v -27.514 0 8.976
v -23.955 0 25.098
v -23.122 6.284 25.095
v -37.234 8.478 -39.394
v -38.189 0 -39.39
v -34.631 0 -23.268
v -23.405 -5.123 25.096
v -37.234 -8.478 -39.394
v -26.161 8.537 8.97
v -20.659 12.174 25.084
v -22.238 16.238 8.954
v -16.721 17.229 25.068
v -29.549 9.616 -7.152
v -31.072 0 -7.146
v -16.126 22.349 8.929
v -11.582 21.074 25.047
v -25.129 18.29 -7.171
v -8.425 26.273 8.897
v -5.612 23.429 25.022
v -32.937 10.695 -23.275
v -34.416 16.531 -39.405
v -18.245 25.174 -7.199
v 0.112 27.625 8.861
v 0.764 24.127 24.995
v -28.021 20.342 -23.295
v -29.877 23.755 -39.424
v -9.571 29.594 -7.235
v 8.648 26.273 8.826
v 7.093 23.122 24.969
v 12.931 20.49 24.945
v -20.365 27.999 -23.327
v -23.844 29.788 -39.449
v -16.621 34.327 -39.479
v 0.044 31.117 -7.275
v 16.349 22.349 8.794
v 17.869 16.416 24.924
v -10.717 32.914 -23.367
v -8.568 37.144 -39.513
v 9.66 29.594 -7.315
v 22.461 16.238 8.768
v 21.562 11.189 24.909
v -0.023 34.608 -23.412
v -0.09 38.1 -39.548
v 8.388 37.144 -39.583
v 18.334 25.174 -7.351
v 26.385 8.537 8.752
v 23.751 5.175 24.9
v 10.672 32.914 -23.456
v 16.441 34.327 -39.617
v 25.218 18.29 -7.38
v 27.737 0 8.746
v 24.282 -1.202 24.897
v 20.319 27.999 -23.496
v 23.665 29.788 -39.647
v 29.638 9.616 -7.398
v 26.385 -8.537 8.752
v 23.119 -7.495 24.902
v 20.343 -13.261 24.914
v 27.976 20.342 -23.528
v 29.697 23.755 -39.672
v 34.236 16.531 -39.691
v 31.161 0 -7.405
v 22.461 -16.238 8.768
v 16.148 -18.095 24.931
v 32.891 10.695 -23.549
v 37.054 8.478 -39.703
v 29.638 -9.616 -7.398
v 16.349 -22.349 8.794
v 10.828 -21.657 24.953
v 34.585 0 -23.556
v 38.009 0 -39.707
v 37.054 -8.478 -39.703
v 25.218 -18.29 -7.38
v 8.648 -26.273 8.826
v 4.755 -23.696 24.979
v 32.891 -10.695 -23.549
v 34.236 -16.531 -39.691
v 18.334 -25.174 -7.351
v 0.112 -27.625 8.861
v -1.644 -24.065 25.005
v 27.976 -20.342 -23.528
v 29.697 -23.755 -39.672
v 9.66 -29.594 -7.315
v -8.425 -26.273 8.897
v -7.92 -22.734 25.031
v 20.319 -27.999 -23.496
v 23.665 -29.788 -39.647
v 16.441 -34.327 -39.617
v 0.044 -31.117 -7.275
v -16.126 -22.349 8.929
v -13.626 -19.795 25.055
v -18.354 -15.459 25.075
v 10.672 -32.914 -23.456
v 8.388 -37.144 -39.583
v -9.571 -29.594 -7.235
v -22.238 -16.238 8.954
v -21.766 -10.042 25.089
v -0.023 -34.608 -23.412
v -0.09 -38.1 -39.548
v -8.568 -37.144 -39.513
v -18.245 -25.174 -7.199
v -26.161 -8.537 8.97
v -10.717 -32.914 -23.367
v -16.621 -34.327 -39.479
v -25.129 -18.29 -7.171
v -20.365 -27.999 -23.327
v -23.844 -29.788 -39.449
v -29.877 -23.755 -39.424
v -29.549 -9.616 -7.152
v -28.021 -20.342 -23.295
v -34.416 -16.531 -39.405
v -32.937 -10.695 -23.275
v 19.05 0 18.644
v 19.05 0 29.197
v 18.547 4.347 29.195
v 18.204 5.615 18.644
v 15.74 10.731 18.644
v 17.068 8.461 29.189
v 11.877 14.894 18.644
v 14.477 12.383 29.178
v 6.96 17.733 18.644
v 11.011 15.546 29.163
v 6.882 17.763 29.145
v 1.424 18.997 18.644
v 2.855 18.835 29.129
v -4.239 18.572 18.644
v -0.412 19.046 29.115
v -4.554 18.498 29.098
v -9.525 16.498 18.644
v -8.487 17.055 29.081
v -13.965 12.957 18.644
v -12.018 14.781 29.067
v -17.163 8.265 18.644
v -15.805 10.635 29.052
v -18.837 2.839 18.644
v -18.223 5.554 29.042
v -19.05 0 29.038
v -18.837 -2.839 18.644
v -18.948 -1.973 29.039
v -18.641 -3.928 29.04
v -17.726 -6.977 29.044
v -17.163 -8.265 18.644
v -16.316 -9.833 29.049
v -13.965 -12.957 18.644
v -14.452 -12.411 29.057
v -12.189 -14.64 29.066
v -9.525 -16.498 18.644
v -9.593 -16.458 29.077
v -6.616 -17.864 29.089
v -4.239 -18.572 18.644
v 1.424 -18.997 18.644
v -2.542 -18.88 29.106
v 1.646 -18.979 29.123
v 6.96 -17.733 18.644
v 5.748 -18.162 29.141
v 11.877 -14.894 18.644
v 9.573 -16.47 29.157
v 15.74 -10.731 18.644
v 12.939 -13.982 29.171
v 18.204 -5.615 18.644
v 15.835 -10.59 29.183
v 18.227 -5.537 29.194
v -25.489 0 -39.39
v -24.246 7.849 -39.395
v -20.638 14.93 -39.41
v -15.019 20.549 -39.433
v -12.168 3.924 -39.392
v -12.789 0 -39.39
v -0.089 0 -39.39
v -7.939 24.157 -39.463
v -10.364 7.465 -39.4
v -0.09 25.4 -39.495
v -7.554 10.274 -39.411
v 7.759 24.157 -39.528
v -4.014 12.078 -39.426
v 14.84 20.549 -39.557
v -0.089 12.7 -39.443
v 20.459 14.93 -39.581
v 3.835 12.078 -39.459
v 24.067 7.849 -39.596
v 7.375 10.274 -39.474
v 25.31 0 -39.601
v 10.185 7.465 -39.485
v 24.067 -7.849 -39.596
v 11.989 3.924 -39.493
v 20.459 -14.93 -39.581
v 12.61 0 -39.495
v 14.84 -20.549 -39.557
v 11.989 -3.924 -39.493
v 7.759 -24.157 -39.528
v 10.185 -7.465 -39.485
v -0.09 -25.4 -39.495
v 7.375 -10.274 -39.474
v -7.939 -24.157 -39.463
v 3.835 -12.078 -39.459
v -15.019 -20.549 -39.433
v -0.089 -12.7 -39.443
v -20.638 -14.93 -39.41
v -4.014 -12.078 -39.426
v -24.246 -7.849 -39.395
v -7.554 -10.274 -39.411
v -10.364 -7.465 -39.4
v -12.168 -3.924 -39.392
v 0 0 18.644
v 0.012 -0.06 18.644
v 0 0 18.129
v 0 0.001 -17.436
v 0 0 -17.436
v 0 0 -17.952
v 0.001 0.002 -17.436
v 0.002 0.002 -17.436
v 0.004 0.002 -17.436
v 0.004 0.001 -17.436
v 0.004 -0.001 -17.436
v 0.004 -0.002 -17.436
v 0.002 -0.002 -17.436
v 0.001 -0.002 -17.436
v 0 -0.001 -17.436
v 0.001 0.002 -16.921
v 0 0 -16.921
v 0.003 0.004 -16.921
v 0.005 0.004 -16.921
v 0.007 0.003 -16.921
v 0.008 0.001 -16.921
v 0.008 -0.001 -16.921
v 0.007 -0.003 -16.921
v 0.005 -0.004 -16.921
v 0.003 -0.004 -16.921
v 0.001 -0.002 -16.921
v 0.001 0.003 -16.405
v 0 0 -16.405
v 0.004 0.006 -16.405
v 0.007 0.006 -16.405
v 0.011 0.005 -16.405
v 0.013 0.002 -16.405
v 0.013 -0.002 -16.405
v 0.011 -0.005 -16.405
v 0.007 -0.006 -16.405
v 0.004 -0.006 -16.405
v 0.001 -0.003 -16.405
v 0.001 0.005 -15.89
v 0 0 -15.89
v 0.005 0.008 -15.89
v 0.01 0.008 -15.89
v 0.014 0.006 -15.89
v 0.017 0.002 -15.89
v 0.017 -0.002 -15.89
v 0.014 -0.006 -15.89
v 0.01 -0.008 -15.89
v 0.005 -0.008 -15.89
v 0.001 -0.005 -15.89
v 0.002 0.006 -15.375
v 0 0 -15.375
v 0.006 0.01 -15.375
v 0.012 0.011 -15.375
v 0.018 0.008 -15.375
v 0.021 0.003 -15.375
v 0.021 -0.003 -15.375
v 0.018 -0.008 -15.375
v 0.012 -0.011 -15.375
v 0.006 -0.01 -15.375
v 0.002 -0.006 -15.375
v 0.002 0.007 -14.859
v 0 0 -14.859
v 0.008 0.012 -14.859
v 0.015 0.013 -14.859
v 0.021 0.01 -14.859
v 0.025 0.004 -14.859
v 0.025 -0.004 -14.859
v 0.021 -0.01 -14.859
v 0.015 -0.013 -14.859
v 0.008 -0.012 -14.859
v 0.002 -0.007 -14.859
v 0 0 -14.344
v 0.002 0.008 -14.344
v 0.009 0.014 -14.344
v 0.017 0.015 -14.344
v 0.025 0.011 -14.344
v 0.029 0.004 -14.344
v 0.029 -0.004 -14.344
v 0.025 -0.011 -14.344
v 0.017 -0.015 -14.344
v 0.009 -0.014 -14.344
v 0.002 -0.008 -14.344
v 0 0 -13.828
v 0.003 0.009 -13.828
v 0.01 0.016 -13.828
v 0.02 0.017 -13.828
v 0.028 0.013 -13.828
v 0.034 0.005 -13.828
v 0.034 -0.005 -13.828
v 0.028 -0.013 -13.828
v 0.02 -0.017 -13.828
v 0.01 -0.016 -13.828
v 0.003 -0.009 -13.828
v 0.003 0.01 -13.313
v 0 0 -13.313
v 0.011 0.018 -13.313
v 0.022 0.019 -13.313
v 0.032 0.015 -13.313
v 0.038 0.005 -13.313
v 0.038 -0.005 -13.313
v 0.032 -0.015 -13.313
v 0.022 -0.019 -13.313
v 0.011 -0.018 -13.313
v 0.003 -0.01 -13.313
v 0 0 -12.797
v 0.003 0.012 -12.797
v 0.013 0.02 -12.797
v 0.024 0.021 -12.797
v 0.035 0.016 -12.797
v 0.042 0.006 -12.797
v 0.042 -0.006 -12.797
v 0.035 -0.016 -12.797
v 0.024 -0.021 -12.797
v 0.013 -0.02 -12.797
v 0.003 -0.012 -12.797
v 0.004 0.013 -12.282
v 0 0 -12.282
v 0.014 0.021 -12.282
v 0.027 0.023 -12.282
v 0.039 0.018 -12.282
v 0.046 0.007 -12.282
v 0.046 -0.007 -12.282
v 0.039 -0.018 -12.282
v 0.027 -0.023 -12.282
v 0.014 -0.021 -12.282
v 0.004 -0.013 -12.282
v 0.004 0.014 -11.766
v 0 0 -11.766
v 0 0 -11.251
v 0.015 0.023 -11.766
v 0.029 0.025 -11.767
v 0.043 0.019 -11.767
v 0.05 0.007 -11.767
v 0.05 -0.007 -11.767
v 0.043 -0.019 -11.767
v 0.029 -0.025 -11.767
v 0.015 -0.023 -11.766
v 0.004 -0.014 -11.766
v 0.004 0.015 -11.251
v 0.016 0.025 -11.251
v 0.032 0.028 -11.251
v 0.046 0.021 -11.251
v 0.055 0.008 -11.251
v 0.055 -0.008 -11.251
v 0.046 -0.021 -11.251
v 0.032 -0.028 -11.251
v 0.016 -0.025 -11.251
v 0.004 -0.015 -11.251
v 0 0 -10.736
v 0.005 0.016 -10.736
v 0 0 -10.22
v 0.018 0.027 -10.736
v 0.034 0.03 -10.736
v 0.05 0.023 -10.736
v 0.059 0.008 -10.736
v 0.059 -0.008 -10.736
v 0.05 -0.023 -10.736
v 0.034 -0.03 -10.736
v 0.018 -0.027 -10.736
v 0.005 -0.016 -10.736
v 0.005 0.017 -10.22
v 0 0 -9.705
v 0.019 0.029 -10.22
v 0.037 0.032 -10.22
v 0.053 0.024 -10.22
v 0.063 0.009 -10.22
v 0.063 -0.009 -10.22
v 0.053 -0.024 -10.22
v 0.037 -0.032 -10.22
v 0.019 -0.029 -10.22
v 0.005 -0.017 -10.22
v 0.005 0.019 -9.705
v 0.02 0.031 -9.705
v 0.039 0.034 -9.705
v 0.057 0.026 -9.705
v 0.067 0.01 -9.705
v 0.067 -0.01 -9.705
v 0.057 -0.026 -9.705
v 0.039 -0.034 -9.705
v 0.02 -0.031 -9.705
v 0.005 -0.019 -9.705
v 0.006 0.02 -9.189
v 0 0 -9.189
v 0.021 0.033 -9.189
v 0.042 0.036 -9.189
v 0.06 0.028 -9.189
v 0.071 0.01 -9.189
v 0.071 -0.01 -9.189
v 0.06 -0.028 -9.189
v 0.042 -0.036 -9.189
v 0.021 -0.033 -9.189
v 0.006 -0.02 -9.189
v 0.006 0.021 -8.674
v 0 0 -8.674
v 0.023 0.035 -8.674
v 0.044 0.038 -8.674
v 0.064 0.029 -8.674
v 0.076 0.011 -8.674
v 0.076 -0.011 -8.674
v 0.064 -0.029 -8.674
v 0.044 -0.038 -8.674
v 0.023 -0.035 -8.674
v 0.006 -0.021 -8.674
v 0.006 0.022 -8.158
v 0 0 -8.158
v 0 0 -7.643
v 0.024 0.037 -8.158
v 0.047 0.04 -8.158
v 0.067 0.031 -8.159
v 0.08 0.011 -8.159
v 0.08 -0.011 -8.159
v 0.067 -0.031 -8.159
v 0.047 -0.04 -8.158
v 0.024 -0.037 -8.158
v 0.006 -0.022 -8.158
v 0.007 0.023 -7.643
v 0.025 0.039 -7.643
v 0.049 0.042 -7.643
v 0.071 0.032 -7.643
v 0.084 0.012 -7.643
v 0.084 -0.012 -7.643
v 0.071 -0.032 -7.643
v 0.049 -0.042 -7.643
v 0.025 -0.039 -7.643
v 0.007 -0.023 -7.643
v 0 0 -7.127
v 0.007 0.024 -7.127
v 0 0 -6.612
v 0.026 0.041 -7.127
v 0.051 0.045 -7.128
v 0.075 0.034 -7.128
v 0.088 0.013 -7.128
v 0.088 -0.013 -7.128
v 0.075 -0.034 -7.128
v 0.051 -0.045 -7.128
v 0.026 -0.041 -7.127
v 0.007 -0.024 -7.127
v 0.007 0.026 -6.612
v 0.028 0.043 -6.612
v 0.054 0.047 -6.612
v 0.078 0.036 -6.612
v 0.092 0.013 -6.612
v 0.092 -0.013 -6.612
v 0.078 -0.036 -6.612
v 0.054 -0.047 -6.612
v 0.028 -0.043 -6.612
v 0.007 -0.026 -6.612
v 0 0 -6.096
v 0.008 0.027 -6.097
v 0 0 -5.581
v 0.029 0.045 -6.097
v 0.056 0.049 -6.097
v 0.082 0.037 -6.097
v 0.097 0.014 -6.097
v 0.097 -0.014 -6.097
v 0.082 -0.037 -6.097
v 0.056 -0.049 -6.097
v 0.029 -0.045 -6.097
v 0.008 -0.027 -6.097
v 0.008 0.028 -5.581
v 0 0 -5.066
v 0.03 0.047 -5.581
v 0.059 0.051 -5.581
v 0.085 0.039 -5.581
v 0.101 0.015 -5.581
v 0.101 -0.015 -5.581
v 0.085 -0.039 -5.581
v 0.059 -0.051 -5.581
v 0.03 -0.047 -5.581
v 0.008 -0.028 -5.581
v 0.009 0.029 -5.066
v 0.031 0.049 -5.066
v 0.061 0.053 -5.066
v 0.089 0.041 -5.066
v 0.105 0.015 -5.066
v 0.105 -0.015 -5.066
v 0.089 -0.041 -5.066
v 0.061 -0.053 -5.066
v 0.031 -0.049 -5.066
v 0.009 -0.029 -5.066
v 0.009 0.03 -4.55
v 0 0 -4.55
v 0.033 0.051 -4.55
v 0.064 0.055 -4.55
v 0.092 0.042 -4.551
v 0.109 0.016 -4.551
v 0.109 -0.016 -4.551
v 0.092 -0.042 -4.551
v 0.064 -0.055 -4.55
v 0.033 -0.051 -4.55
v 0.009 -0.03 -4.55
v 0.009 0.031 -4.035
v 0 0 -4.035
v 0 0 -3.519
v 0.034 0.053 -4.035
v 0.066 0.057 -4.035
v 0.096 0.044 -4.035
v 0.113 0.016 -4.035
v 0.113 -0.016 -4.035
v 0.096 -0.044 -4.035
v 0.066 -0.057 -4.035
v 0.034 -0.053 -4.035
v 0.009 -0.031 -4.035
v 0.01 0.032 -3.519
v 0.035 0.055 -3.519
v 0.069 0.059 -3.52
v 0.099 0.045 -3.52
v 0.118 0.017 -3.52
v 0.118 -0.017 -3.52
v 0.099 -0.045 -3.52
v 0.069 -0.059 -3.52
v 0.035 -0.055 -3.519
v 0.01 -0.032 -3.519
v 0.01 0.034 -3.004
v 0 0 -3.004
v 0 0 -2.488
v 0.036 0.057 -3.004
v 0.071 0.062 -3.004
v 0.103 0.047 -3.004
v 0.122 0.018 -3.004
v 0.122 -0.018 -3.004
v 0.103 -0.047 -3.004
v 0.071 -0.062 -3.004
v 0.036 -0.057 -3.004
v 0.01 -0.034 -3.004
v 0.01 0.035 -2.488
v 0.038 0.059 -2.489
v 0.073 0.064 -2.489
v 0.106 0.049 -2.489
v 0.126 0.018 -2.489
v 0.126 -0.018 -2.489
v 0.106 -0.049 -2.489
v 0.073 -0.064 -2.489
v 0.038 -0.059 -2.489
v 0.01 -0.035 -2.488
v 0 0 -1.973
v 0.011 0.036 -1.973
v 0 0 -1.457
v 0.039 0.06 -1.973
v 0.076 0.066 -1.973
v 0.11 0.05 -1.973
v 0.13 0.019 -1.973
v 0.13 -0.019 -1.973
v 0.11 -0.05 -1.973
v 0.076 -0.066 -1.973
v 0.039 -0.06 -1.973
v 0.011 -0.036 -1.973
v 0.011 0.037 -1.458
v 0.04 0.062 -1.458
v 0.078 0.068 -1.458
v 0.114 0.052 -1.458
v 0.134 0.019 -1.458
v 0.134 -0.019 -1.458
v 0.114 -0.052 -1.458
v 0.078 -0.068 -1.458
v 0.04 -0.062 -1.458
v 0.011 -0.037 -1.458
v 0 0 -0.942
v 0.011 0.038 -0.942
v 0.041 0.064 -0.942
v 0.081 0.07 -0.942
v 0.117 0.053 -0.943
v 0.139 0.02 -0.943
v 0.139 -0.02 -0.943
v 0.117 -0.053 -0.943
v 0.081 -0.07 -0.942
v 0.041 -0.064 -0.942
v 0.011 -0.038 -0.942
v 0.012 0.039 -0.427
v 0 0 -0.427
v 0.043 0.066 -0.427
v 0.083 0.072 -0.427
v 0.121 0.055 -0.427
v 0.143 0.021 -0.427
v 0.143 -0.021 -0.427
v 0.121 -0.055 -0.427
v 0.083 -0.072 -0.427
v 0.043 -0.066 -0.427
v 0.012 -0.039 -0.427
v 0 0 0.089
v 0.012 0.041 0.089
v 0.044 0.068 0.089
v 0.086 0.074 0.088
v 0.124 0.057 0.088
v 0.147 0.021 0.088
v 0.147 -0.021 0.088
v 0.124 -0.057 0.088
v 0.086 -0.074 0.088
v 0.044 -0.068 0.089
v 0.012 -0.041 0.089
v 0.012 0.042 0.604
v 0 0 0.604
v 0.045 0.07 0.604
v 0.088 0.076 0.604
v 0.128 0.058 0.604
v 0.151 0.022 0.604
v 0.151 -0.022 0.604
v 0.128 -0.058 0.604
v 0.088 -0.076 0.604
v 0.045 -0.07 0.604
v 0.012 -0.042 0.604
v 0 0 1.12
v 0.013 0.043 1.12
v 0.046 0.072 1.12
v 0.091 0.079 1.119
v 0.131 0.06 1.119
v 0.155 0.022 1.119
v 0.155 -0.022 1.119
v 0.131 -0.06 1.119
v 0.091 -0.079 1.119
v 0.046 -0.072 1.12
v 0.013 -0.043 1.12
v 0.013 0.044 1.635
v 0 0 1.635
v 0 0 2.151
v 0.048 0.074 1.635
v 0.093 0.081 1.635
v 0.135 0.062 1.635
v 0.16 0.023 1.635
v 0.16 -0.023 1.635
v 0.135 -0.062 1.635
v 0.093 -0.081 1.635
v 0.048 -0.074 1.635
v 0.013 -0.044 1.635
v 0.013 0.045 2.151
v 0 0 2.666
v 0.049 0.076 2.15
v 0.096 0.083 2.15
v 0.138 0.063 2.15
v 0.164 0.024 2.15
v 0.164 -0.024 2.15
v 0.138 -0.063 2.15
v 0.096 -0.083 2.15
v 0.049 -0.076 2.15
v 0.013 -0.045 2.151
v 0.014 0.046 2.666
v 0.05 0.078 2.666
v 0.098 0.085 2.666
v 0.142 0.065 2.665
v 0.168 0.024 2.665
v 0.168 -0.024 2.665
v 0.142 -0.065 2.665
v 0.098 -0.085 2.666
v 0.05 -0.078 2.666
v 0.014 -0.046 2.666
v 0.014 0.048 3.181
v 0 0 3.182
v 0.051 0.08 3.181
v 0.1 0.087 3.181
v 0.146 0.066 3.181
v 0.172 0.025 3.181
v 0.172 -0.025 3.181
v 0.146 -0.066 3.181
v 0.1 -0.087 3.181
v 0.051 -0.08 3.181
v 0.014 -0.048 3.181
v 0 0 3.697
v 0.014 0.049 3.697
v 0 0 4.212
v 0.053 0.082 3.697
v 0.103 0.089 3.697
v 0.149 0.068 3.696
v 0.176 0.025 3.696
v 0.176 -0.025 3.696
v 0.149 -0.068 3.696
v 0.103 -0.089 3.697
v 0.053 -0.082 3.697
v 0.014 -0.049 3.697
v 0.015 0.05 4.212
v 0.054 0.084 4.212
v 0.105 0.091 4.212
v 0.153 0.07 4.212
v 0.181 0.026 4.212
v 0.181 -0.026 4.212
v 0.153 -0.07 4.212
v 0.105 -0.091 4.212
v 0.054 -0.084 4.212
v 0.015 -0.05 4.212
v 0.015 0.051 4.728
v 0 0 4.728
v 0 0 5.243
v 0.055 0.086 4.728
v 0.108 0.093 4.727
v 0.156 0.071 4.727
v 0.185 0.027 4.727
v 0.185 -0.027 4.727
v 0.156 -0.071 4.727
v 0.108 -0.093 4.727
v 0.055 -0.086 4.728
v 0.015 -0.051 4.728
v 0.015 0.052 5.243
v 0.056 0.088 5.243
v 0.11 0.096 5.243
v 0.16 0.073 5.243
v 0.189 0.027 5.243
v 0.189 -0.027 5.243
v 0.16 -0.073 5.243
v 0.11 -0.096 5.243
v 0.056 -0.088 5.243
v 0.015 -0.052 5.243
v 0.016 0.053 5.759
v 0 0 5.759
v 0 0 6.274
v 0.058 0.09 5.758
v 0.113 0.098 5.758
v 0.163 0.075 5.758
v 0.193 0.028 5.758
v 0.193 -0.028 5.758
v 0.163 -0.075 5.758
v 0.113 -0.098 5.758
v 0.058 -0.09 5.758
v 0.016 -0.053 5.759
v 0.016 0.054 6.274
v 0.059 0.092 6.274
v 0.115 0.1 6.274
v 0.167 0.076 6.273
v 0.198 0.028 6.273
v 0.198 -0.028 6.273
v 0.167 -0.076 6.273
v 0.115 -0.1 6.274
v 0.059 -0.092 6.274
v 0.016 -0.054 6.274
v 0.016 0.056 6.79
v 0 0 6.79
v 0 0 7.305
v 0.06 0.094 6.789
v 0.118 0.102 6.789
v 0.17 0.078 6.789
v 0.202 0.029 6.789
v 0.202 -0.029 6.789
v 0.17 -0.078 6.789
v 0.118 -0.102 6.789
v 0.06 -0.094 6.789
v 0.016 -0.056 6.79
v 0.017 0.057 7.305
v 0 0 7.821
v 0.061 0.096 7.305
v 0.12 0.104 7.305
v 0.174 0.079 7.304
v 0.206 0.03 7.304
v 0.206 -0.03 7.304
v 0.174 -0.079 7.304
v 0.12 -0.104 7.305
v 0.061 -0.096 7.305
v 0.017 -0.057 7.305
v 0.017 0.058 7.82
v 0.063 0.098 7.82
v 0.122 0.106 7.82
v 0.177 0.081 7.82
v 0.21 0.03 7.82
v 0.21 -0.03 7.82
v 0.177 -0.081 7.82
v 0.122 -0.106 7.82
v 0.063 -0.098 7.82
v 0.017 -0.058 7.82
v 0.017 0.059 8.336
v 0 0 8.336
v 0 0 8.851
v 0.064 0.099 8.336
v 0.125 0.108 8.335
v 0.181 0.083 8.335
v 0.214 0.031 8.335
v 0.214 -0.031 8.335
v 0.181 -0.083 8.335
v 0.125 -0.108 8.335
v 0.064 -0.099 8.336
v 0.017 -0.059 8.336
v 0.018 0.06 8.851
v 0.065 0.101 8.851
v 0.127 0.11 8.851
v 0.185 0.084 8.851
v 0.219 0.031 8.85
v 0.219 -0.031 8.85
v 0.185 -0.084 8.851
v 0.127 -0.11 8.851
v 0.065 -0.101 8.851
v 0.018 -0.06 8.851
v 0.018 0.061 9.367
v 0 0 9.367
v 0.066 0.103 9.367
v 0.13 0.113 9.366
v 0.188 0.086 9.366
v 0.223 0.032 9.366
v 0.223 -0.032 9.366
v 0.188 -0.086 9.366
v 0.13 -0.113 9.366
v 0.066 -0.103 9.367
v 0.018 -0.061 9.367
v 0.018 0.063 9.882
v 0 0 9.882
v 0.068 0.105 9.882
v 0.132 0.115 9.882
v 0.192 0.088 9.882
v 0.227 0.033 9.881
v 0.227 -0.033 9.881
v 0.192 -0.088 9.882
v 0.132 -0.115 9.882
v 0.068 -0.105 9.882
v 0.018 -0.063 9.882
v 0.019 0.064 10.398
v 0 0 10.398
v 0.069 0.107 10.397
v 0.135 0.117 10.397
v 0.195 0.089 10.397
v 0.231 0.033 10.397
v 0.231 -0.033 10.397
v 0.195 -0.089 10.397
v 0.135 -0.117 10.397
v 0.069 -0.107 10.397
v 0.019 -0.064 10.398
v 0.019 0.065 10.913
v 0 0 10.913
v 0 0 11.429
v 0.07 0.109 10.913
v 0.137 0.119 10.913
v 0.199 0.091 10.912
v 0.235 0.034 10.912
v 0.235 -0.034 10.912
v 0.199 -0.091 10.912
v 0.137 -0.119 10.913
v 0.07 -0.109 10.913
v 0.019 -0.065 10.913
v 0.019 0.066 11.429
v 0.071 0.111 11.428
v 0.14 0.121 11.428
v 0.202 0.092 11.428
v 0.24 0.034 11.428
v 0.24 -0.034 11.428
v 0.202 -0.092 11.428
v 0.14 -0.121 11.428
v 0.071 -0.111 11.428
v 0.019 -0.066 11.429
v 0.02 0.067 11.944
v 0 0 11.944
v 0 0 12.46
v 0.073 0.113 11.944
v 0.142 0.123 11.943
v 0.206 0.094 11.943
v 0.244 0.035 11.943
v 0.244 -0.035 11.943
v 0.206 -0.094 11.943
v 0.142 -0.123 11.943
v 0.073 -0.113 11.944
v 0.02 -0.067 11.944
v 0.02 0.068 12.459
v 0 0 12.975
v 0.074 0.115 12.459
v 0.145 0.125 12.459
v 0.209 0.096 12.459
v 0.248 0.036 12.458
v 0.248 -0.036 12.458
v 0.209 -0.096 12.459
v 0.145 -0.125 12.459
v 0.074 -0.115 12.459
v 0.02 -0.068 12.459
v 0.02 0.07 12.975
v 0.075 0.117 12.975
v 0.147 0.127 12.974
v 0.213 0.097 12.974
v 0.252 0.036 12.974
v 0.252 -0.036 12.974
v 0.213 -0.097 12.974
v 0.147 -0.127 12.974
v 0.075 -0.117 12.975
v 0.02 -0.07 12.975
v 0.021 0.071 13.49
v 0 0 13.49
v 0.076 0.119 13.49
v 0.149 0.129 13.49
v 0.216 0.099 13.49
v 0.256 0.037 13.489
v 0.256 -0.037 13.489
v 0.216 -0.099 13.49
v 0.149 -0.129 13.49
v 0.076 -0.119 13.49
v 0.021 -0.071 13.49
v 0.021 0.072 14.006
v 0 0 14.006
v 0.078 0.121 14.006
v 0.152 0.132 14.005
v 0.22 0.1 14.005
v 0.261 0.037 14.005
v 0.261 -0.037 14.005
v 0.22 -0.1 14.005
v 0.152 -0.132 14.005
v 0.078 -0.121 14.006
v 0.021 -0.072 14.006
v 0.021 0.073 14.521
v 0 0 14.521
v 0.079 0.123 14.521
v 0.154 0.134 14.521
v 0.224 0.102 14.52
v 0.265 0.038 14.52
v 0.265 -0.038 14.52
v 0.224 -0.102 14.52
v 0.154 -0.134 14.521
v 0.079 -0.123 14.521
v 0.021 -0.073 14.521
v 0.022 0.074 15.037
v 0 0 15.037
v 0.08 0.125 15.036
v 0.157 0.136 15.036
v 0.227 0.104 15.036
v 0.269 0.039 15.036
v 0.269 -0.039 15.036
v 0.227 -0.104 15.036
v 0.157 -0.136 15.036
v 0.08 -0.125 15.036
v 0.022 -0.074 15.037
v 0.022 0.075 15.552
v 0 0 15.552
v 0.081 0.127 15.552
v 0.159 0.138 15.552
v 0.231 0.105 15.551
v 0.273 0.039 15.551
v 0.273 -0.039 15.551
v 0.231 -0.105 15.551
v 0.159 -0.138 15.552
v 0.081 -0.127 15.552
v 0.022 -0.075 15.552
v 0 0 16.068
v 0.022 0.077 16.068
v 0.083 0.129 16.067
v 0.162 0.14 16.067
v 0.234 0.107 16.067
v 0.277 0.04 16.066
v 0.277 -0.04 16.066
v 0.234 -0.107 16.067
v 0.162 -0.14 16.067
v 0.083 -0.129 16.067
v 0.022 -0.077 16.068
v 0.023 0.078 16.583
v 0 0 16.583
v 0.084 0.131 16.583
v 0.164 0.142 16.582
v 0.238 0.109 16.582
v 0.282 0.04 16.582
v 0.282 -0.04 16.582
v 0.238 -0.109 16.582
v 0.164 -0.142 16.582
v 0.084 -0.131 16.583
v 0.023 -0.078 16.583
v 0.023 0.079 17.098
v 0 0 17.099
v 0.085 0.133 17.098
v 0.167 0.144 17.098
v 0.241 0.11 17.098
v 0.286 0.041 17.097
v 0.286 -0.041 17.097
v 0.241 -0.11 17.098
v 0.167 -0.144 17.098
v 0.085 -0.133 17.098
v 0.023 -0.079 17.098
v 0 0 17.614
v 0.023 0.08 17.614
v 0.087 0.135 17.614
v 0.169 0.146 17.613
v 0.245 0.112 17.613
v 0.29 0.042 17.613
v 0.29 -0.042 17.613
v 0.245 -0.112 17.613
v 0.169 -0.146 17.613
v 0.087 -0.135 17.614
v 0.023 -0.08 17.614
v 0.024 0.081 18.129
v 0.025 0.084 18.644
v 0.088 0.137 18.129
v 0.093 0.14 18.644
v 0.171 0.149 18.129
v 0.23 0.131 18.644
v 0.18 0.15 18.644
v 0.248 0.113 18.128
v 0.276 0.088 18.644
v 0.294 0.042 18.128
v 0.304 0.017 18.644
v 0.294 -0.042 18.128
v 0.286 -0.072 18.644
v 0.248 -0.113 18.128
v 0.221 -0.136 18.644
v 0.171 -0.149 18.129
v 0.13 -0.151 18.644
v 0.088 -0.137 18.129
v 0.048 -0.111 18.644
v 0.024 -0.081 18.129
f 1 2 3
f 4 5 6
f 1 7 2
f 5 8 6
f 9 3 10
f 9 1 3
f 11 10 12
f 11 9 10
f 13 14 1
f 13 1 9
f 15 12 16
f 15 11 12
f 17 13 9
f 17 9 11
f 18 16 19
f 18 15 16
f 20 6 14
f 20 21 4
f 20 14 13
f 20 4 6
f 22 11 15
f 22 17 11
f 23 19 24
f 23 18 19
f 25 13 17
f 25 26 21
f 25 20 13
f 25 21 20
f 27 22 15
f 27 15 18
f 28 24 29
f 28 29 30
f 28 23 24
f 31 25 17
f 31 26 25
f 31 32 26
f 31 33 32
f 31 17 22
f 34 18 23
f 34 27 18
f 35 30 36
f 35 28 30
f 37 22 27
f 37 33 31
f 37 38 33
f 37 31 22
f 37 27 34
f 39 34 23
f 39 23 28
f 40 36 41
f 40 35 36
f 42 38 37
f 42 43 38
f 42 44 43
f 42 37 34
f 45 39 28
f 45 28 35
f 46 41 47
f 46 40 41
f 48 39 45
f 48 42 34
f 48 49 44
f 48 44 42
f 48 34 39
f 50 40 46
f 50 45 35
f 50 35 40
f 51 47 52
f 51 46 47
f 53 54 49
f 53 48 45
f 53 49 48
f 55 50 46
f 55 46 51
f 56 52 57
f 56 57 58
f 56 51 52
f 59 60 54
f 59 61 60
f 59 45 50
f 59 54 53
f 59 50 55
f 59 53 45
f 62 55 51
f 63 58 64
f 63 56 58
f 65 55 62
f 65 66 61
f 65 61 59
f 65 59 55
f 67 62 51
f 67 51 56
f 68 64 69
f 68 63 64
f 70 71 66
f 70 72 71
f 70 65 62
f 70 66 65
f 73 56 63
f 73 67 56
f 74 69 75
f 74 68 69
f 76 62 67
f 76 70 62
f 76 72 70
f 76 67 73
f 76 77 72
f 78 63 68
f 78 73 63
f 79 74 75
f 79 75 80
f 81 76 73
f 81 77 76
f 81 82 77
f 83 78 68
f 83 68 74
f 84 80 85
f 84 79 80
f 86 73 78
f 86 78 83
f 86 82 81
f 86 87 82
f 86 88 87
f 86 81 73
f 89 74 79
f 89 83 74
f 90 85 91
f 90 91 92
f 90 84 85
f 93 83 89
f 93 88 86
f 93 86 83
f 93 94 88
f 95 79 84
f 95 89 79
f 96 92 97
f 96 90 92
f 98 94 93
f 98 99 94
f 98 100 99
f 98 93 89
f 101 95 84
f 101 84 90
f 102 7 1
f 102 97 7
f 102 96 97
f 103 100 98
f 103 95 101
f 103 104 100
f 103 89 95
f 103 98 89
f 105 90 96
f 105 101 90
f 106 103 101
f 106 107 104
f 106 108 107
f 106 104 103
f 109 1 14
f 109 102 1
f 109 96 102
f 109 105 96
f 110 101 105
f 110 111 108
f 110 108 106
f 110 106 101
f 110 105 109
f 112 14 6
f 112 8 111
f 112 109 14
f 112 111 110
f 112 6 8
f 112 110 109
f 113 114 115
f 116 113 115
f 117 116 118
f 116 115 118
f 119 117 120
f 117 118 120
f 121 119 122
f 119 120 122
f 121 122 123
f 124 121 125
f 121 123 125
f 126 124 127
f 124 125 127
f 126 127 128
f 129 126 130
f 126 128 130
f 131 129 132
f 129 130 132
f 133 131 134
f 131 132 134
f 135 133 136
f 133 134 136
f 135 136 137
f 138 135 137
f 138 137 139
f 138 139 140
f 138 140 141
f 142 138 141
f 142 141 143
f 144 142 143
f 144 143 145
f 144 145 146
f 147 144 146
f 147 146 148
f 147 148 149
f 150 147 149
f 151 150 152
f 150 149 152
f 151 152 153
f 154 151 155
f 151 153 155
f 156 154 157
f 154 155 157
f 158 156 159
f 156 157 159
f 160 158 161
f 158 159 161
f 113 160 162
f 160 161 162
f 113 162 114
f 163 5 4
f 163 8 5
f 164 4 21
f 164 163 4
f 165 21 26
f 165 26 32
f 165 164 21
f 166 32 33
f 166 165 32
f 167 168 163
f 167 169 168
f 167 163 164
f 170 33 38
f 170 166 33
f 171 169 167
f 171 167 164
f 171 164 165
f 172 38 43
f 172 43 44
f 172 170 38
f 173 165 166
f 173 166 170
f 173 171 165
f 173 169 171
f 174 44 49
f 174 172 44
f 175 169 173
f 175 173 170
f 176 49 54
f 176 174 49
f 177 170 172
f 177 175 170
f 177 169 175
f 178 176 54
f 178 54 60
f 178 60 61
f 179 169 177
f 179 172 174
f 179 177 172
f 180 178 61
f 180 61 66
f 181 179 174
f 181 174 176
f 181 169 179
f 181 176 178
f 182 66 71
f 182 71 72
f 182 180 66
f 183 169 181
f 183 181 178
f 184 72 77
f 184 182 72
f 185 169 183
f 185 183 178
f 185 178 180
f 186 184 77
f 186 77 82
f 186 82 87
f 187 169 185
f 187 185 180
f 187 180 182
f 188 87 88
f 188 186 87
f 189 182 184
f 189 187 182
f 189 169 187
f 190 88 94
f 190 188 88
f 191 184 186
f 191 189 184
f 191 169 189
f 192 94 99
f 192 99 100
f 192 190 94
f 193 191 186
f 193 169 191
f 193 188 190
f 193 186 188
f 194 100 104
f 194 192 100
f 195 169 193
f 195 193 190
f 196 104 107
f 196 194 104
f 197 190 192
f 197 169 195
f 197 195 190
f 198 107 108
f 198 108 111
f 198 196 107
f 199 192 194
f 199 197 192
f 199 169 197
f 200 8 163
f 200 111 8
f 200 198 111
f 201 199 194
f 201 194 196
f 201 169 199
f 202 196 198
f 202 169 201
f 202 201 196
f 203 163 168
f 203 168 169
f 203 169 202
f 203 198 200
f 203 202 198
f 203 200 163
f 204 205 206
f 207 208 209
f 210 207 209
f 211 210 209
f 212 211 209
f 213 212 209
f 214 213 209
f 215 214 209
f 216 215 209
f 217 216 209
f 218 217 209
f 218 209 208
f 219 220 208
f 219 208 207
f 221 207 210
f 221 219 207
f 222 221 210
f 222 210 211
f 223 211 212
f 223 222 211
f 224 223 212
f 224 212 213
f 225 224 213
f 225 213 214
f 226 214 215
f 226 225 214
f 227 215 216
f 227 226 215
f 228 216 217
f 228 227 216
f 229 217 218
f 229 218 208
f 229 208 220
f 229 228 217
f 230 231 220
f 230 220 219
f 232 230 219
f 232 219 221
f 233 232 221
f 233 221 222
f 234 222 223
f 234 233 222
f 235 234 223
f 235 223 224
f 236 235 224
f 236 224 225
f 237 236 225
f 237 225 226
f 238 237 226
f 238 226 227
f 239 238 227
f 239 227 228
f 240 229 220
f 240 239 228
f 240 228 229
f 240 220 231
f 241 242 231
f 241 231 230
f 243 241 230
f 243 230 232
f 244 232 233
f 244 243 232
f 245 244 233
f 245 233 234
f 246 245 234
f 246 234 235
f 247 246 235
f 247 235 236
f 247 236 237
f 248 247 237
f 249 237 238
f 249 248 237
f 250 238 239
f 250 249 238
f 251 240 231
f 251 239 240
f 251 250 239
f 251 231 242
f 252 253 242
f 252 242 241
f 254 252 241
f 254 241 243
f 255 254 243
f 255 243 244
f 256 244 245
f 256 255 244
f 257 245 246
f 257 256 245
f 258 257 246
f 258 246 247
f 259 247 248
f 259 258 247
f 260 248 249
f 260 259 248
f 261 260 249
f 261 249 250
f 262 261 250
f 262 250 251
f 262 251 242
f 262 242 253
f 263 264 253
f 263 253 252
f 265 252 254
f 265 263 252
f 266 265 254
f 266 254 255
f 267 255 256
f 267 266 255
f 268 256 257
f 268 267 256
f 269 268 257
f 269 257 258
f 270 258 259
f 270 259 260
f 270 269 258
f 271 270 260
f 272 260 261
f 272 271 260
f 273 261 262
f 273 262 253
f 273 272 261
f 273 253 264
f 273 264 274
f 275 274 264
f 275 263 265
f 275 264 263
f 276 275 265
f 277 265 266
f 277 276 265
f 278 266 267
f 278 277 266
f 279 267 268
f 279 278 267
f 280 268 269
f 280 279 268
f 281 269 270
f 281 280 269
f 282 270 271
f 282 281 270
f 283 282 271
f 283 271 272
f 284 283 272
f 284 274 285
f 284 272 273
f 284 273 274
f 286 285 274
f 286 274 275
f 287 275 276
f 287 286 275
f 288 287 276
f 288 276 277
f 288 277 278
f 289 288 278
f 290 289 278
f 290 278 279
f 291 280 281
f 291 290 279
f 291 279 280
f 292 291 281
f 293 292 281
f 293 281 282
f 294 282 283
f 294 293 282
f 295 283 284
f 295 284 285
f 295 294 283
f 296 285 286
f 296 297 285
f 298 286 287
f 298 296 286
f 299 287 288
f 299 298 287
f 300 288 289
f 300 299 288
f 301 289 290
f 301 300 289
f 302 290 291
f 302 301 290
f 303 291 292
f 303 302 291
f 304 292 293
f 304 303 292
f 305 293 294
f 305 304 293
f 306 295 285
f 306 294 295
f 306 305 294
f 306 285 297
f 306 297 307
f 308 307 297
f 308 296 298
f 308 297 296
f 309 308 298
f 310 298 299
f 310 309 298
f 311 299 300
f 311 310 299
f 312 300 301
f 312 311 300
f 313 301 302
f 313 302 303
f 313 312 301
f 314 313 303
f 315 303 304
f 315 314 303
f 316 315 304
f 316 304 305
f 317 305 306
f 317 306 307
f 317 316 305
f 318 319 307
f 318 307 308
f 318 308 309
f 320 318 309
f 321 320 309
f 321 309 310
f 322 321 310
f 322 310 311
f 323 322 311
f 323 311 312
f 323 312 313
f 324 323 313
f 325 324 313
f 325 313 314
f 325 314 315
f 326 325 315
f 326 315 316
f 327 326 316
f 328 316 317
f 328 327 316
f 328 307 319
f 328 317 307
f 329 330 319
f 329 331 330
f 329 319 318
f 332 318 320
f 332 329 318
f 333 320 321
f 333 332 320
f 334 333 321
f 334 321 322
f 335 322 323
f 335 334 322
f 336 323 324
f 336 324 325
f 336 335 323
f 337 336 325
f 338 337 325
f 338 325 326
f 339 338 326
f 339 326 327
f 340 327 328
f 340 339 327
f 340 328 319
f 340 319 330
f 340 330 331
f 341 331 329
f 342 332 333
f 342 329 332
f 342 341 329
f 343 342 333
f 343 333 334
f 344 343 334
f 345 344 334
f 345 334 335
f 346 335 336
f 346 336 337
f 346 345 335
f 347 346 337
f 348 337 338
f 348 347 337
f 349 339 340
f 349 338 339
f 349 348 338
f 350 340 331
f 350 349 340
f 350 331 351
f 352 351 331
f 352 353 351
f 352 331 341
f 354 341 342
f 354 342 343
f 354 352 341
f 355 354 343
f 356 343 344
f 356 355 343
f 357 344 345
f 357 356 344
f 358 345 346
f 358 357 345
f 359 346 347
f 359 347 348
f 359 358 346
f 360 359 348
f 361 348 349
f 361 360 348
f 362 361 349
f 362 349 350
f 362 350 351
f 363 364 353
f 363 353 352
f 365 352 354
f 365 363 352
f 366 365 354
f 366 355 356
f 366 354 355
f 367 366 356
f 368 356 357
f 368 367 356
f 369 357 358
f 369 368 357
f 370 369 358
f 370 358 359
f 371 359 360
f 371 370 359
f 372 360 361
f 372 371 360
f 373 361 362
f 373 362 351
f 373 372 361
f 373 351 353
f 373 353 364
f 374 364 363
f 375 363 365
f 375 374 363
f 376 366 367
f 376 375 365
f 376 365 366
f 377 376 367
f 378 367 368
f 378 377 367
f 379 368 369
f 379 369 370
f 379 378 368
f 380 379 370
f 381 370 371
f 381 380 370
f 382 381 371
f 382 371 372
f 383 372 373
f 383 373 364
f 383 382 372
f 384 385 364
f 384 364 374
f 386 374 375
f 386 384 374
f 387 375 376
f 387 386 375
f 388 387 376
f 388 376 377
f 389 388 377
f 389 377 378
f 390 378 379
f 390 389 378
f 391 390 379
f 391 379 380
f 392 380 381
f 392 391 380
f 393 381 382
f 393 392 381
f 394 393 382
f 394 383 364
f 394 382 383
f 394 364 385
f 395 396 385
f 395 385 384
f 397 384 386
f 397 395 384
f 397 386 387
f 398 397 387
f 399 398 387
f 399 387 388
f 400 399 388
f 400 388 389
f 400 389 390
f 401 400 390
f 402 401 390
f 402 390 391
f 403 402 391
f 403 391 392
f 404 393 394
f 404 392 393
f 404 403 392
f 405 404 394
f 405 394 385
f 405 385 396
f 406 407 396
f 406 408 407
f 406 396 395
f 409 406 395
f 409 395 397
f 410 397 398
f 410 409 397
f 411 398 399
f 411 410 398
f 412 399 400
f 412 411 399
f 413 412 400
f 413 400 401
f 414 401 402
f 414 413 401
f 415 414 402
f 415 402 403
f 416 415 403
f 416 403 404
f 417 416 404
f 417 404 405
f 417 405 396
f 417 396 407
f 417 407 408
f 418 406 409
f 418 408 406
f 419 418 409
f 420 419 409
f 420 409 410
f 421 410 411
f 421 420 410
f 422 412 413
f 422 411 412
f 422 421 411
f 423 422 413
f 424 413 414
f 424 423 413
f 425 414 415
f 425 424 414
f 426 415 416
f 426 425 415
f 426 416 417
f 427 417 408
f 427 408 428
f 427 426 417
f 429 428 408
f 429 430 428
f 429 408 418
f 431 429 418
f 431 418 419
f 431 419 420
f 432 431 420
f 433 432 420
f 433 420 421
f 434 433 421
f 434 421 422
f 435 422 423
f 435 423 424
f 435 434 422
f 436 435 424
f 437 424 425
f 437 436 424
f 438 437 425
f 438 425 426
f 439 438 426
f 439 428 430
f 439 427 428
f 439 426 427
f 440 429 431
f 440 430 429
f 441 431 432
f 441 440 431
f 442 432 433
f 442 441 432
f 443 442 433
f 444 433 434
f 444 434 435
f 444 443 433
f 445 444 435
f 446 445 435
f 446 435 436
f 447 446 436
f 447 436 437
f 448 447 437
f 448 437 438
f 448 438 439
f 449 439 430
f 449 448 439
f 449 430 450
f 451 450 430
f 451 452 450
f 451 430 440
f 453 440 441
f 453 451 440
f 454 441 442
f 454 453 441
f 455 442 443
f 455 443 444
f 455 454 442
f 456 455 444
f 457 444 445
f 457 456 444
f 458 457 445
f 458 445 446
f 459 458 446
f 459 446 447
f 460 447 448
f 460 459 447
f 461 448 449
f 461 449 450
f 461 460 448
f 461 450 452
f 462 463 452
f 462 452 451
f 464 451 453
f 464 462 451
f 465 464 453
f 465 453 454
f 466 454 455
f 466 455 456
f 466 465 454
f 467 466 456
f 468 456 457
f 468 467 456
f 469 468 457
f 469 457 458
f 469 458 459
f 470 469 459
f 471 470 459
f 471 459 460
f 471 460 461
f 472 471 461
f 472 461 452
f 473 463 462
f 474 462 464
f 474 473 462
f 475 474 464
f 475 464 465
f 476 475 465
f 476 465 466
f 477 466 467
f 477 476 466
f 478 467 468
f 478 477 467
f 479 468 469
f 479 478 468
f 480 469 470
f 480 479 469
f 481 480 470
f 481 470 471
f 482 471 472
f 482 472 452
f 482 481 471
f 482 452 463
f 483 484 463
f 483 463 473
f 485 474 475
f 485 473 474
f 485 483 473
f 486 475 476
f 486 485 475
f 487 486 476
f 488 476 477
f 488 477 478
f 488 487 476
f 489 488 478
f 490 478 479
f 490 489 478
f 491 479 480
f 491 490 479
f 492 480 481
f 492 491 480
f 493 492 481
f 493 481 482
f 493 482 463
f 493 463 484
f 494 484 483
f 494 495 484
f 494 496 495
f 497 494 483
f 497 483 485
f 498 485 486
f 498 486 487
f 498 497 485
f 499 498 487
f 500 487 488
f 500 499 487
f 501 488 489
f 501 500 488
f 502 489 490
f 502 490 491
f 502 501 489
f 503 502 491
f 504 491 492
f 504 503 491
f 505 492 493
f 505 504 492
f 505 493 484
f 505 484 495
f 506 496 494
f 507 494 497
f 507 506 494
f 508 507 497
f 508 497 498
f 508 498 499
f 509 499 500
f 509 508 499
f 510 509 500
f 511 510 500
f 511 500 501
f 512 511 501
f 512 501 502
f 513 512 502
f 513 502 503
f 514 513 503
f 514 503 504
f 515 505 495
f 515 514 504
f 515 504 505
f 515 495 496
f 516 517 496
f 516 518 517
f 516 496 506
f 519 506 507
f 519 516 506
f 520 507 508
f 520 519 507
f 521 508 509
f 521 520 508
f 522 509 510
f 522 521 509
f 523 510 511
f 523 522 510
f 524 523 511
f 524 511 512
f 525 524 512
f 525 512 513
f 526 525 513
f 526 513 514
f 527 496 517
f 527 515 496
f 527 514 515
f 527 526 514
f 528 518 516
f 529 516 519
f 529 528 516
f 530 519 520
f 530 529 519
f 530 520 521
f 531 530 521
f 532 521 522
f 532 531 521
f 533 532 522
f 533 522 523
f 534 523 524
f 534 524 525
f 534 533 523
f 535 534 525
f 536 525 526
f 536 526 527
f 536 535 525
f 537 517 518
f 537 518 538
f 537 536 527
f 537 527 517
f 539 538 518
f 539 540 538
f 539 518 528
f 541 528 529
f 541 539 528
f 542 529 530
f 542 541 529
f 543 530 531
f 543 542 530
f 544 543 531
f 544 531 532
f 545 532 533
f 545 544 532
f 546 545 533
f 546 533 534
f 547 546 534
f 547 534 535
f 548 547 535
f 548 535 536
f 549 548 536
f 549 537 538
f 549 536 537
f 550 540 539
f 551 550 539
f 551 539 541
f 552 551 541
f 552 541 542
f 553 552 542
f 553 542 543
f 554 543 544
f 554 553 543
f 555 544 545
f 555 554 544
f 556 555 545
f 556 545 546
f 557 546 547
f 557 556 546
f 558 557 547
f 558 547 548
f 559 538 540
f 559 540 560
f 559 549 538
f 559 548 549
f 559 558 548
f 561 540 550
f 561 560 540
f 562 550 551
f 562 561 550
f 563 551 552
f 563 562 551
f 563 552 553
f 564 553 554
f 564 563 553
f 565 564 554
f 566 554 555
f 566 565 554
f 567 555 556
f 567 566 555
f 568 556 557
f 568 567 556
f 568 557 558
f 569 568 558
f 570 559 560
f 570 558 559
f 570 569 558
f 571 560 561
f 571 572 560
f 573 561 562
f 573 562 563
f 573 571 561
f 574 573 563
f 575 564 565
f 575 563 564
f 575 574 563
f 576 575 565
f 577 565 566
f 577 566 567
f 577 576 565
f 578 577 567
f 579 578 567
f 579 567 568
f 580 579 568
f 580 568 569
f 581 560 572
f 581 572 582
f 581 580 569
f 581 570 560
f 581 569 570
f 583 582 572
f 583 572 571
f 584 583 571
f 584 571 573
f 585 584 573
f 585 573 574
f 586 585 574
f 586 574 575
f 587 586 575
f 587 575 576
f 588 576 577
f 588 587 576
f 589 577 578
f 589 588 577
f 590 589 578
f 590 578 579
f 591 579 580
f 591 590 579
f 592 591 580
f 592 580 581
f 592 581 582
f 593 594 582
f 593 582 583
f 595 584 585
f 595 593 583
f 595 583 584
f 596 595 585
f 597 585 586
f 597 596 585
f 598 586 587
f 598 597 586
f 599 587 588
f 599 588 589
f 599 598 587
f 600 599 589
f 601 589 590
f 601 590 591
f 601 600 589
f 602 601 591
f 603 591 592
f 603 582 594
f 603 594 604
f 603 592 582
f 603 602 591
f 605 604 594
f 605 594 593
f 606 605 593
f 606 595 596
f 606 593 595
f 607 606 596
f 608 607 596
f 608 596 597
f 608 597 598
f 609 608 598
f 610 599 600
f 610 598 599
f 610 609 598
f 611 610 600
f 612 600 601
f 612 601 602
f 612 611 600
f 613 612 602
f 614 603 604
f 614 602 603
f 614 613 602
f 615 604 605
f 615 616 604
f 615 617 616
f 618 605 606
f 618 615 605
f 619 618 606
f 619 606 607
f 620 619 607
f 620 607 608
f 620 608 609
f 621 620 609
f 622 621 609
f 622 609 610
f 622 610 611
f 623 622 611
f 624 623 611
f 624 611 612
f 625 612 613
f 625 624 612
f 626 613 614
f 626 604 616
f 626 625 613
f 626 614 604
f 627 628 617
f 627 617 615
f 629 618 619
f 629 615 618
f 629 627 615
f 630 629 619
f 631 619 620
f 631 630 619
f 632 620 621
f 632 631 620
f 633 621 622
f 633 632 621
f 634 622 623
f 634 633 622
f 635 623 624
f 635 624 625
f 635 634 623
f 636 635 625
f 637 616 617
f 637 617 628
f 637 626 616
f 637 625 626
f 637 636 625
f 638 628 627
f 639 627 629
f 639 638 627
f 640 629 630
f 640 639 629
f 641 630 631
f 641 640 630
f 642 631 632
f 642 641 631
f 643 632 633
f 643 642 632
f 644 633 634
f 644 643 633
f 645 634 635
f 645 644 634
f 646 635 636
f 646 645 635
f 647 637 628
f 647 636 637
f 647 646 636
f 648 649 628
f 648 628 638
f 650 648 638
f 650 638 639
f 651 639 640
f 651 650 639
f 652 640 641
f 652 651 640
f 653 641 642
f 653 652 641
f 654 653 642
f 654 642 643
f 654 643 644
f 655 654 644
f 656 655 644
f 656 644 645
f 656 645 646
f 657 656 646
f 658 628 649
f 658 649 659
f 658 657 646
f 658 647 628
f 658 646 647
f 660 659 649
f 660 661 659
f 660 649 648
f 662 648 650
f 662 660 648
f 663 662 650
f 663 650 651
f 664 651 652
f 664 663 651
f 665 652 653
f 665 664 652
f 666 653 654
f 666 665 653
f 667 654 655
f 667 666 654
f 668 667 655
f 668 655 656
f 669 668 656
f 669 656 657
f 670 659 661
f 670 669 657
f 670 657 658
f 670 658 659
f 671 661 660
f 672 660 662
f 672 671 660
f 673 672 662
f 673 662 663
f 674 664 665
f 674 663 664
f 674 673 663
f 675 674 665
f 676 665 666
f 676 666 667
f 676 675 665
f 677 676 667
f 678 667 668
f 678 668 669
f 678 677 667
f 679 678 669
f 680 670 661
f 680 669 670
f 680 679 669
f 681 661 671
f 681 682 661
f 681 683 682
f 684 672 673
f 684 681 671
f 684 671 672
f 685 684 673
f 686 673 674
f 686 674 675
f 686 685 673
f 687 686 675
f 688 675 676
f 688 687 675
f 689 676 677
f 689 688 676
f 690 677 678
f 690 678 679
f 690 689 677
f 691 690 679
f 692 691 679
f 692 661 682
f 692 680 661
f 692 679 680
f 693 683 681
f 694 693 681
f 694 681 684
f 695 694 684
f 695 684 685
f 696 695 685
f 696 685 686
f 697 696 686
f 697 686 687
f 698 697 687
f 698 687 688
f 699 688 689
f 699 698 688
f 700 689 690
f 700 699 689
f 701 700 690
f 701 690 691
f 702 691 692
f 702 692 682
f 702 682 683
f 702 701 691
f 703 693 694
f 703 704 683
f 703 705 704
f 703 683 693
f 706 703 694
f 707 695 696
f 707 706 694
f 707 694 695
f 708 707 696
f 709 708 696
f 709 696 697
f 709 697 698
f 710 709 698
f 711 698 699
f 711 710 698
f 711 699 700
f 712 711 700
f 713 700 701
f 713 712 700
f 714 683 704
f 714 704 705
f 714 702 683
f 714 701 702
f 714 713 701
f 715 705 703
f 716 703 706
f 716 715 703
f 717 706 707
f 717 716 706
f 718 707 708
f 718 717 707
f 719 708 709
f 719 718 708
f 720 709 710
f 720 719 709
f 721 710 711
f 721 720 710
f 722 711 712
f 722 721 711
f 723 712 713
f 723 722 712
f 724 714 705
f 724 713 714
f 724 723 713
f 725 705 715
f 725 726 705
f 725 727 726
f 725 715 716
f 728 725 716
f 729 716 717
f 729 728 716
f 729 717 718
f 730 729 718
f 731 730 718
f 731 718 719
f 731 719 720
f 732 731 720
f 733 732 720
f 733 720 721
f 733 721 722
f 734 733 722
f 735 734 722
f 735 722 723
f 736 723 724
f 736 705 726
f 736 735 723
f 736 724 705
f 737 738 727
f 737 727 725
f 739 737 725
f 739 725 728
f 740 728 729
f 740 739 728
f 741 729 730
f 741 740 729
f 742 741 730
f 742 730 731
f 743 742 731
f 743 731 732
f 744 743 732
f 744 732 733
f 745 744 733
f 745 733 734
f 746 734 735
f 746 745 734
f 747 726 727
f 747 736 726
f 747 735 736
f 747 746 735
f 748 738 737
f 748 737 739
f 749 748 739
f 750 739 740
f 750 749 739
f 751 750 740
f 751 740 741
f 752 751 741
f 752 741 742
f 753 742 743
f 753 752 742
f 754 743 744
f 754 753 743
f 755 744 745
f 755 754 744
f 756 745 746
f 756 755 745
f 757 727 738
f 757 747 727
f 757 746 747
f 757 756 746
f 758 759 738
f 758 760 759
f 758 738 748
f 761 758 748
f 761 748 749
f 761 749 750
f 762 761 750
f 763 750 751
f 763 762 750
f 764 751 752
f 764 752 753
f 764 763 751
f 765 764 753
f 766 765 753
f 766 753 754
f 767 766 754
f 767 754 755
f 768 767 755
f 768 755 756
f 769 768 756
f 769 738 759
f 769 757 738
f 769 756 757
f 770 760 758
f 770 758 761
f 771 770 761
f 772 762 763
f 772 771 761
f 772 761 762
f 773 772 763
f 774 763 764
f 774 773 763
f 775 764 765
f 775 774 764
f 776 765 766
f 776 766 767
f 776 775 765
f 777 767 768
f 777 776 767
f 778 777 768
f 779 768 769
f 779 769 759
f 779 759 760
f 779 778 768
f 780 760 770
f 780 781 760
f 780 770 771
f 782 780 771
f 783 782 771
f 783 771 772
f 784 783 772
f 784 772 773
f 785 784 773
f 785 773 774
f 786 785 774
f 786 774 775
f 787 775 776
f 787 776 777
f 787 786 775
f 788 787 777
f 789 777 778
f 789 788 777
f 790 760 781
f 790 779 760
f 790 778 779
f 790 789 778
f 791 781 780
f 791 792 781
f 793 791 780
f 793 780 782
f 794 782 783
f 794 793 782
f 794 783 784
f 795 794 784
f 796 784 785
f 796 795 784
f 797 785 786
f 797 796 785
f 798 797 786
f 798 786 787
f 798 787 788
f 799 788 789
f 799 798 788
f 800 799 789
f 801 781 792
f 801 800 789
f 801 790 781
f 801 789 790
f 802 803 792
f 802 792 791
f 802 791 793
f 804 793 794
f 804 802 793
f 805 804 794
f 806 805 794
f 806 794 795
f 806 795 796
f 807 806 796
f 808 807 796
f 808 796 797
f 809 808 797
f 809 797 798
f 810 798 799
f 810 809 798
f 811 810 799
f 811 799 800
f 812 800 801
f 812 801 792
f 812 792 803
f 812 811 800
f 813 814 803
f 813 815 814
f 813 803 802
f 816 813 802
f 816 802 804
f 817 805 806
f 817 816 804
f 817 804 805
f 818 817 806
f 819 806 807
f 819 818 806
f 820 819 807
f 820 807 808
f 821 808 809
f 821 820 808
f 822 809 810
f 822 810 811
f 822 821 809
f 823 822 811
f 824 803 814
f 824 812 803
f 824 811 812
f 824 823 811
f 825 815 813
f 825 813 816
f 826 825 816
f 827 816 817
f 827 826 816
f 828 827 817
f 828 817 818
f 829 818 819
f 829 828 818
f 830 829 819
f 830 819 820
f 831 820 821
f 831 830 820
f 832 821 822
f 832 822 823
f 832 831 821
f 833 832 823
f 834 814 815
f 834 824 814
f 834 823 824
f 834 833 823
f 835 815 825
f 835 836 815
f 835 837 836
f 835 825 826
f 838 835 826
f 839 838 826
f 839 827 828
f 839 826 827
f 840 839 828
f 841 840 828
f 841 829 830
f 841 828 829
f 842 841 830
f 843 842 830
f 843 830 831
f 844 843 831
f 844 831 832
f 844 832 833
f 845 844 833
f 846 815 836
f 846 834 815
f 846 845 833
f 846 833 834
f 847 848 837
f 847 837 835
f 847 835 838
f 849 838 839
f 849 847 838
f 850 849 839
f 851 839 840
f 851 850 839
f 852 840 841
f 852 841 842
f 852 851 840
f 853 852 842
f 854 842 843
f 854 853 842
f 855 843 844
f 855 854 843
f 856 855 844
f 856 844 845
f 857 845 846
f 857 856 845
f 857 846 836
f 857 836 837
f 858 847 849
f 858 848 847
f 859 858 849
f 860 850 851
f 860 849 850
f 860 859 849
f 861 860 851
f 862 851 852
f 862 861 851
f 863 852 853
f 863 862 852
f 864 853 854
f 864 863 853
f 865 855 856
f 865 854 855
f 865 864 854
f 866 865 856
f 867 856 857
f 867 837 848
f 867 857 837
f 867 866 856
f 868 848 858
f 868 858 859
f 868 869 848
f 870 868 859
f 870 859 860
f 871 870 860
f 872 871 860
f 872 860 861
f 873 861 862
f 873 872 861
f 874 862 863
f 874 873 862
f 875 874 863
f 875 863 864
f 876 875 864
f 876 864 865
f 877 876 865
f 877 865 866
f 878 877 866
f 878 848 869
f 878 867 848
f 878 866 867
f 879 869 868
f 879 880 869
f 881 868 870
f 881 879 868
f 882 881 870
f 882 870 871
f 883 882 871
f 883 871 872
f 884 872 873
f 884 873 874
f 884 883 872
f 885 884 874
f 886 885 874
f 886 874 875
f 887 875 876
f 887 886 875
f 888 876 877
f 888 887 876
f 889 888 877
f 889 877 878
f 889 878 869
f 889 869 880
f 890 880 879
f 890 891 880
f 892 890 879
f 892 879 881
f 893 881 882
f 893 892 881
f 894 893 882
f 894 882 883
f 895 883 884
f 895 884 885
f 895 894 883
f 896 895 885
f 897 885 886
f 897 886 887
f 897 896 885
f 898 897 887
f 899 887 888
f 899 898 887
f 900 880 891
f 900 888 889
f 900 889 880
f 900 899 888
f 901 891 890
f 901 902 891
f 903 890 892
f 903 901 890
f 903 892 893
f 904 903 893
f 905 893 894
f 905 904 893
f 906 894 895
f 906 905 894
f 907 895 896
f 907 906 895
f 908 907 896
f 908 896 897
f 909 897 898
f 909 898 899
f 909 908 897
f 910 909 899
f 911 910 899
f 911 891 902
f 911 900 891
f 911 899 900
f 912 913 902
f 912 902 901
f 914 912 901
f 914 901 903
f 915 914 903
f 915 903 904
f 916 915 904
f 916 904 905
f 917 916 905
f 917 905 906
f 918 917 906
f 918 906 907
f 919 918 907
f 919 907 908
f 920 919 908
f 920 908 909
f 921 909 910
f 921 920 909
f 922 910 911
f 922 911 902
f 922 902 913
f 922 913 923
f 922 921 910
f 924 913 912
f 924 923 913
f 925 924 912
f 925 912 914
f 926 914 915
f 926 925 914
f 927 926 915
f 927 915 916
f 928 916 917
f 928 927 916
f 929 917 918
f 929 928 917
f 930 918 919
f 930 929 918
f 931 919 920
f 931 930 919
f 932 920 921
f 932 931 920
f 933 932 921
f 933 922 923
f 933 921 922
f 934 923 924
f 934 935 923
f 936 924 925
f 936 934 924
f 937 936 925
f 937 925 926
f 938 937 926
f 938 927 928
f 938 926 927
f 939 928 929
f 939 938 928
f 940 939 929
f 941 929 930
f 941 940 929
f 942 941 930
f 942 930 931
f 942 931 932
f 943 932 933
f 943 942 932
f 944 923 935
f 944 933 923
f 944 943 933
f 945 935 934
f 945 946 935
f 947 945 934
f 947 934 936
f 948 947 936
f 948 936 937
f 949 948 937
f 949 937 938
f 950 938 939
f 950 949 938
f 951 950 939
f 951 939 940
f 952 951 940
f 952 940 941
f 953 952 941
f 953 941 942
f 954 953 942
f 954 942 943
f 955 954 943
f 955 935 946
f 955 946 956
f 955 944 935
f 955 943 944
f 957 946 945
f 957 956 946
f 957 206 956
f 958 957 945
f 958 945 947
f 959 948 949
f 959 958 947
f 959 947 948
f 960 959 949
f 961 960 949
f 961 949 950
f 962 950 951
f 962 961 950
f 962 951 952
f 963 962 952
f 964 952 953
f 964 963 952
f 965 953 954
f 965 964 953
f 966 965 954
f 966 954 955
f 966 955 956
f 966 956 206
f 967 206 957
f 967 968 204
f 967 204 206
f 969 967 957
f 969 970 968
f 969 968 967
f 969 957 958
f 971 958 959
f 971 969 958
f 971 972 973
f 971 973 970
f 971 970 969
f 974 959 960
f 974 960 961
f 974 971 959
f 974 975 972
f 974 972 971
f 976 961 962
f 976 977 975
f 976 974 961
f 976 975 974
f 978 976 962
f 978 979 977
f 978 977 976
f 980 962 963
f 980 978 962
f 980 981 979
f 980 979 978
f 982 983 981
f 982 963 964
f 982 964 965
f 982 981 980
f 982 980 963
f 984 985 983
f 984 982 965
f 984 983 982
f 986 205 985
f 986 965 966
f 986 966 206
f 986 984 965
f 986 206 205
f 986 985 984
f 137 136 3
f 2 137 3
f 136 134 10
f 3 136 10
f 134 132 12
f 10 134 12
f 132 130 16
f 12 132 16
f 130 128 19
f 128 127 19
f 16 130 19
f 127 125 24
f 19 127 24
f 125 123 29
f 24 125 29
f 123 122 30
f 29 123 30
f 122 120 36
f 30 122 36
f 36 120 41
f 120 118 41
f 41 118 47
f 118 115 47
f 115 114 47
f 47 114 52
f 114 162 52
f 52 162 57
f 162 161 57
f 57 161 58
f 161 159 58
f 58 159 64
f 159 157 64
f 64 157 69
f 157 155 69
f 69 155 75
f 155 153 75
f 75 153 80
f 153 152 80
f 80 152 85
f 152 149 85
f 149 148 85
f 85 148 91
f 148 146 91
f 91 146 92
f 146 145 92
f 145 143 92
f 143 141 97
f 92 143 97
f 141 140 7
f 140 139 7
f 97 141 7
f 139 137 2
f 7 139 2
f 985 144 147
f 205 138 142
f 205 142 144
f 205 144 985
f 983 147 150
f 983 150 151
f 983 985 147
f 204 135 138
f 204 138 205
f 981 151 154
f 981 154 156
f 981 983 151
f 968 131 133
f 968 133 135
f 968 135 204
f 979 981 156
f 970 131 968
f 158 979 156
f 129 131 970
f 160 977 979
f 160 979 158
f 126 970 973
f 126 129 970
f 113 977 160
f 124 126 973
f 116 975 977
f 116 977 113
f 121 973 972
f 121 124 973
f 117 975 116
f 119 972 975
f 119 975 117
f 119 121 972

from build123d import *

# Parameters (mm, degrees)
F2_SIZE  = 5.08
F4_R     = 19.05
F5_DEPTH = 11.43


with BuildPart() as f1:
    # F0 (on Front) → F1 (revolve)
    with BuildSketch(Plane.XZ):
        Polygon((0, -17.9517306387), (0, 30.058646322), (-22.86, 30.058646322), (-38.1891950965, -39.389681071), (-0.0891950965, -39.389681071), align=None)
    revolve(axis=Axis((-0.0445975482, 0, -28.6707058549), (-0.0041605808, 0, -0.9999913447)))

    # F2
    f2_edges = [f1.edges().sort_by_distance(p)[0] for p in [
        (23.258707, 0, 29.866764),
    ]]
    chamfer(f2_edges, length=F2_SIZE)

    # F4 (on offset) → F5 (cut)
    with BuildSketch(Plane.XY.offset(30.0736)):
        Circle(F4_R)
    extrude(amount=-F5_DEPTH, mode=Mode.SUBTRACT)


solid = f1.part
